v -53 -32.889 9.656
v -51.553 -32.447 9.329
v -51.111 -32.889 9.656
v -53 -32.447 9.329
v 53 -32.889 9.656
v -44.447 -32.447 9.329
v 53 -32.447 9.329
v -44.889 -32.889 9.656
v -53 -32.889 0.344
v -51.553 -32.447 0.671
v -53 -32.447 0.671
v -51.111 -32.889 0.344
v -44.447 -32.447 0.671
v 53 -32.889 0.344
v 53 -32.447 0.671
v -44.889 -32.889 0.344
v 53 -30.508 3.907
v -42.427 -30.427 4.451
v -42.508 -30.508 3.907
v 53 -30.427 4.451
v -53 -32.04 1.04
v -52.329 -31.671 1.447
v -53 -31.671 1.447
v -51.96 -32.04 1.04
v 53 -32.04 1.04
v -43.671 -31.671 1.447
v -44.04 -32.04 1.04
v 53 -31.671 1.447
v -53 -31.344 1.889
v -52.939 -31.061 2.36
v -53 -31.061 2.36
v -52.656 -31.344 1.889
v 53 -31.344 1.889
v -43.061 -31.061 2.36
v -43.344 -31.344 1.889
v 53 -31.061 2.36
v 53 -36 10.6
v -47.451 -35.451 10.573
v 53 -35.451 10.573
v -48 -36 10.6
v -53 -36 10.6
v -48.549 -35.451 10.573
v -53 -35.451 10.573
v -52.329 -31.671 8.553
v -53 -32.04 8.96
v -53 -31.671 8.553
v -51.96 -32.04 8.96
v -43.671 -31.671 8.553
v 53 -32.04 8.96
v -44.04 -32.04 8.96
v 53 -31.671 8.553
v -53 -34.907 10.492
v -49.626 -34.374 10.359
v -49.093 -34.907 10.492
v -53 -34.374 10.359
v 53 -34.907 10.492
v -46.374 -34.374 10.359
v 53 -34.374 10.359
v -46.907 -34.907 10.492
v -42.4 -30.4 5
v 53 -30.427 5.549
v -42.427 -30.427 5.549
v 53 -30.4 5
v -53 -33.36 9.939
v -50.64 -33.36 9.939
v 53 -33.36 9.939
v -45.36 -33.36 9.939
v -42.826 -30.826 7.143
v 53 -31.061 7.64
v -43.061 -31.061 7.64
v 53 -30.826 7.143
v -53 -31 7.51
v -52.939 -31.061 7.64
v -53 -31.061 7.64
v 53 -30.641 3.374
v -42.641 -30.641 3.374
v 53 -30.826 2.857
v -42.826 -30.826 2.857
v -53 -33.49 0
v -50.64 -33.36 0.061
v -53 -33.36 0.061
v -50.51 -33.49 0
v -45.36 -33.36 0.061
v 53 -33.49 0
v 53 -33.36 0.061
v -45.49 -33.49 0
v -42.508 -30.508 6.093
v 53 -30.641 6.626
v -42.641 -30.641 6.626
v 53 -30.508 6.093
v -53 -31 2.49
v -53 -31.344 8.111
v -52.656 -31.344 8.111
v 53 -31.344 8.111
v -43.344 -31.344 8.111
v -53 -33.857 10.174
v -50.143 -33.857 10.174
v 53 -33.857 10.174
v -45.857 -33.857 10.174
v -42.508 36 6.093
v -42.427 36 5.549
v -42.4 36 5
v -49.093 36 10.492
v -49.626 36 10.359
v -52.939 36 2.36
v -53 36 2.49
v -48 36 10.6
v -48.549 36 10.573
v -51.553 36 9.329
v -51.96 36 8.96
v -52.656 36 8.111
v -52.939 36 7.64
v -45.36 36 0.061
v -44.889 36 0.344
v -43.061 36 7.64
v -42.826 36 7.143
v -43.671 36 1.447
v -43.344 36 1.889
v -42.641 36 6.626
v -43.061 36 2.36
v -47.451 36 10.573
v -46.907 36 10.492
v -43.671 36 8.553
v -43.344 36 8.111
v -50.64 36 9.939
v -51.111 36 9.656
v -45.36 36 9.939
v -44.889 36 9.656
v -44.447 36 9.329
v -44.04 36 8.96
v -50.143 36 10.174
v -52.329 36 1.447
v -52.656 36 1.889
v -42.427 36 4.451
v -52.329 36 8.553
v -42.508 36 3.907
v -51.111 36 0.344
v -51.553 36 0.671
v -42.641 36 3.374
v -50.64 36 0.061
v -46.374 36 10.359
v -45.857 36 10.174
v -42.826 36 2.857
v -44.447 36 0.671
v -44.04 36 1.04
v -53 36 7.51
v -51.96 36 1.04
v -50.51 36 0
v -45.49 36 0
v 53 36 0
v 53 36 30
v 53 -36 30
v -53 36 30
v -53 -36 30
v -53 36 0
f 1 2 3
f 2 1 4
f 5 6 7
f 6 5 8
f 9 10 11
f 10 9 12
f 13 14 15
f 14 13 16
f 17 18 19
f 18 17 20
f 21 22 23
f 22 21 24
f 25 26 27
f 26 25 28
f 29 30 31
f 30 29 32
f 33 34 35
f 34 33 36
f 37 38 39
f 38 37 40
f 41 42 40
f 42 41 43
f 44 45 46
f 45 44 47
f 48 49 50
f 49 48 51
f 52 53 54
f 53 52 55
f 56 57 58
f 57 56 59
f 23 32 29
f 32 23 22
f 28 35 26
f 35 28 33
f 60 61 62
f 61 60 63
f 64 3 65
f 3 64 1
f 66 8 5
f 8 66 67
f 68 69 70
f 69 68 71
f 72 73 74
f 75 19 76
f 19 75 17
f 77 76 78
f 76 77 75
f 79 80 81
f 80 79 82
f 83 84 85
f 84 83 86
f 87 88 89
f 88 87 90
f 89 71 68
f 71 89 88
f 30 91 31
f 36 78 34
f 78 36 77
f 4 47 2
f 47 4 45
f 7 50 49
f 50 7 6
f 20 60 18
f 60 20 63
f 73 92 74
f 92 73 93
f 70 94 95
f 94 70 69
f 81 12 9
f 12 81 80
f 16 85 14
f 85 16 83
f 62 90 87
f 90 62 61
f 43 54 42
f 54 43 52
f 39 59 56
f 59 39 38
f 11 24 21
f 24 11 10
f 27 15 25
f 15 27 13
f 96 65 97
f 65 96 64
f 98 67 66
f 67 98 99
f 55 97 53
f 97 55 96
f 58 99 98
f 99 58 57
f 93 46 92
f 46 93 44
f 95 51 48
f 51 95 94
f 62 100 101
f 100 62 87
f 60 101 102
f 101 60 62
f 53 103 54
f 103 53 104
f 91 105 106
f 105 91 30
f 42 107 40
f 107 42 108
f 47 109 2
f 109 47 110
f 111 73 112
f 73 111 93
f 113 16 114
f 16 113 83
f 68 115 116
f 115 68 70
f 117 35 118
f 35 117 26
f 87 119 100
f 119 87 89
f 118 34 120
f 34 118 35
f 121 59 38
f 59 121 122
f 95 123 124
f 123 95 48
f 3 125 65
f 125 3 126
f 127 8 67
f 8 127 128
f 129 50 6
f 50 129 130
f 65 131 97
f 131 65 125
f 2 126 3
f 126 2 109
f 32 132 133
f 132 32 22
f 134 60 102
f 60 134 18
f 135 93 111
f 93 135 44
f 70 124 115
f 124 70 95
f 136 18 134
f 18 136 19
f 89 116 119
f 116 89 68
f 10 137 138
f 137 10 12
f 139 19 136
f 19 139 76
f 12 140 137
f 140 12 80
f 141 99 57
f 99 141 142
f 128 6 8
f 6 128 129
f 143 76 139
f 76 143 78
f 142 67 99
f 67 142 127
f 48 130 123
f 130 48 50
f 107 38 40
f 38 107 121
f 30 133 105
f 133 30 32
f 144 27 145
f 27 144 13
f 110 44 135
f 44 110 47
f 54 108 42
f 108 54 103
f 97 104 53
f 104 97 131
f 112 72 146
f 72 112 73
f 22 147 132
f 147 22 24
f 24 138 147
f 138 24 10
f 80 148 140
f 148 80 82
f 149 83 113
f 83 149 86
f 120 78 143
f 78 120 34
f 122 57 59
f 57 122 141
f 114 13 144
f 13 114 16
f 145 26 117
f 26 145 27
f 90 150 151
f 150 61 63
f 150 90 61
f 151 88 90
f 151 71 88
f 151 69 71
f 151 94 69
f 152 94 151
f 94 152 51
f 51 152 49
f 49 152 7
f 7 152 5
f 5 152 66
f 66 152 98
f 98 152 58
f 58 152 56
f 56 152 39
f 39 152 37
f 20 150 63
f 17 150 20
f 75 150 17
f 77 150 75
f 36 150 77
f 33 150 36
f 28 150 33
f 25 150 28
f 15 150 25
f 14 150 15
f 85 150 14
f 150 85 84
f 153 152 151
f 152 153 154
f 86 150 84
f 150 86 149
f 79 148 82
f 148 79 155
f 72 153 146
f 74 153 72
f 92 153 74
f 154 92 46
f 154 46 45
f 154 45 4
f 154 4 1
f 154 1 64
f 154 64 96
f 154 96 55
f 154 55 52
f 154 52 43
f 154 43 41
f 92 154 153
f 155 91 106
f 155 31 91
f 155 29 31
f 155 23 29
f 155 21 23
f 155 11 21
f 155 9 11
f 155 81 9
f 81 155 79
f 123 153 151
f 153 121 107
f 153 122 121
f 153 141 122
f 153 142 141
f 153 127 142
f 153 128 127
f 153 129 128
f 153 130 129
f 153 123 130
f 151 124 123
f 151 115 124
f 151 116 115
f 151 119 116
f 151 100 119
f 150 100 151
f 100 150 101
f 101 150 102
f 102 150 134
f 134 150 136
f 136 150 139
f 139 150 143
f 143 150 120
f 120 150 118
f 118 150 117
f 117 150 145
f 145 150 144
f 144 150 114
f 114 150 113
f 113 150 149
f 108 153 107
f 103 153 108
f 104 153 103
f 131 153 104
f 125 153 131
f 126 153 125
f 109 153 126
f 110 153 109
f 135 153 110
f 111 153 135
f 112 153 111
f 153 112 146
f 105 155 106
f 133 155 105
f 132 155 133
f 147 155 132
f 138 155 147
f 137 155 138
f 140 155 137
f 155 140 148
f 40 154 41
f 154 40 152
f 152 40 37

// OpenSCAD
// Built by bench/smallmodels/features/compiler.py from a list of features.
$fn = 64;
difference() {
  union() {
    translate([0, 0, 0]) translate([-53, -36, 0]) cube([106, 72, 30]);
  }
  union() {
    translate([-48, -36, 5]) rotate([0, 0, 0]) rotate([0, 90, 0]) cylinder(d = 11.2, h = 1120, center = true);
    translate([-48, 36, 5]) rotate([0, 0, 0]) rotate([90, 0, 0]) cylinder(d = 11.2, h = 1120, center = true);
  }
}
